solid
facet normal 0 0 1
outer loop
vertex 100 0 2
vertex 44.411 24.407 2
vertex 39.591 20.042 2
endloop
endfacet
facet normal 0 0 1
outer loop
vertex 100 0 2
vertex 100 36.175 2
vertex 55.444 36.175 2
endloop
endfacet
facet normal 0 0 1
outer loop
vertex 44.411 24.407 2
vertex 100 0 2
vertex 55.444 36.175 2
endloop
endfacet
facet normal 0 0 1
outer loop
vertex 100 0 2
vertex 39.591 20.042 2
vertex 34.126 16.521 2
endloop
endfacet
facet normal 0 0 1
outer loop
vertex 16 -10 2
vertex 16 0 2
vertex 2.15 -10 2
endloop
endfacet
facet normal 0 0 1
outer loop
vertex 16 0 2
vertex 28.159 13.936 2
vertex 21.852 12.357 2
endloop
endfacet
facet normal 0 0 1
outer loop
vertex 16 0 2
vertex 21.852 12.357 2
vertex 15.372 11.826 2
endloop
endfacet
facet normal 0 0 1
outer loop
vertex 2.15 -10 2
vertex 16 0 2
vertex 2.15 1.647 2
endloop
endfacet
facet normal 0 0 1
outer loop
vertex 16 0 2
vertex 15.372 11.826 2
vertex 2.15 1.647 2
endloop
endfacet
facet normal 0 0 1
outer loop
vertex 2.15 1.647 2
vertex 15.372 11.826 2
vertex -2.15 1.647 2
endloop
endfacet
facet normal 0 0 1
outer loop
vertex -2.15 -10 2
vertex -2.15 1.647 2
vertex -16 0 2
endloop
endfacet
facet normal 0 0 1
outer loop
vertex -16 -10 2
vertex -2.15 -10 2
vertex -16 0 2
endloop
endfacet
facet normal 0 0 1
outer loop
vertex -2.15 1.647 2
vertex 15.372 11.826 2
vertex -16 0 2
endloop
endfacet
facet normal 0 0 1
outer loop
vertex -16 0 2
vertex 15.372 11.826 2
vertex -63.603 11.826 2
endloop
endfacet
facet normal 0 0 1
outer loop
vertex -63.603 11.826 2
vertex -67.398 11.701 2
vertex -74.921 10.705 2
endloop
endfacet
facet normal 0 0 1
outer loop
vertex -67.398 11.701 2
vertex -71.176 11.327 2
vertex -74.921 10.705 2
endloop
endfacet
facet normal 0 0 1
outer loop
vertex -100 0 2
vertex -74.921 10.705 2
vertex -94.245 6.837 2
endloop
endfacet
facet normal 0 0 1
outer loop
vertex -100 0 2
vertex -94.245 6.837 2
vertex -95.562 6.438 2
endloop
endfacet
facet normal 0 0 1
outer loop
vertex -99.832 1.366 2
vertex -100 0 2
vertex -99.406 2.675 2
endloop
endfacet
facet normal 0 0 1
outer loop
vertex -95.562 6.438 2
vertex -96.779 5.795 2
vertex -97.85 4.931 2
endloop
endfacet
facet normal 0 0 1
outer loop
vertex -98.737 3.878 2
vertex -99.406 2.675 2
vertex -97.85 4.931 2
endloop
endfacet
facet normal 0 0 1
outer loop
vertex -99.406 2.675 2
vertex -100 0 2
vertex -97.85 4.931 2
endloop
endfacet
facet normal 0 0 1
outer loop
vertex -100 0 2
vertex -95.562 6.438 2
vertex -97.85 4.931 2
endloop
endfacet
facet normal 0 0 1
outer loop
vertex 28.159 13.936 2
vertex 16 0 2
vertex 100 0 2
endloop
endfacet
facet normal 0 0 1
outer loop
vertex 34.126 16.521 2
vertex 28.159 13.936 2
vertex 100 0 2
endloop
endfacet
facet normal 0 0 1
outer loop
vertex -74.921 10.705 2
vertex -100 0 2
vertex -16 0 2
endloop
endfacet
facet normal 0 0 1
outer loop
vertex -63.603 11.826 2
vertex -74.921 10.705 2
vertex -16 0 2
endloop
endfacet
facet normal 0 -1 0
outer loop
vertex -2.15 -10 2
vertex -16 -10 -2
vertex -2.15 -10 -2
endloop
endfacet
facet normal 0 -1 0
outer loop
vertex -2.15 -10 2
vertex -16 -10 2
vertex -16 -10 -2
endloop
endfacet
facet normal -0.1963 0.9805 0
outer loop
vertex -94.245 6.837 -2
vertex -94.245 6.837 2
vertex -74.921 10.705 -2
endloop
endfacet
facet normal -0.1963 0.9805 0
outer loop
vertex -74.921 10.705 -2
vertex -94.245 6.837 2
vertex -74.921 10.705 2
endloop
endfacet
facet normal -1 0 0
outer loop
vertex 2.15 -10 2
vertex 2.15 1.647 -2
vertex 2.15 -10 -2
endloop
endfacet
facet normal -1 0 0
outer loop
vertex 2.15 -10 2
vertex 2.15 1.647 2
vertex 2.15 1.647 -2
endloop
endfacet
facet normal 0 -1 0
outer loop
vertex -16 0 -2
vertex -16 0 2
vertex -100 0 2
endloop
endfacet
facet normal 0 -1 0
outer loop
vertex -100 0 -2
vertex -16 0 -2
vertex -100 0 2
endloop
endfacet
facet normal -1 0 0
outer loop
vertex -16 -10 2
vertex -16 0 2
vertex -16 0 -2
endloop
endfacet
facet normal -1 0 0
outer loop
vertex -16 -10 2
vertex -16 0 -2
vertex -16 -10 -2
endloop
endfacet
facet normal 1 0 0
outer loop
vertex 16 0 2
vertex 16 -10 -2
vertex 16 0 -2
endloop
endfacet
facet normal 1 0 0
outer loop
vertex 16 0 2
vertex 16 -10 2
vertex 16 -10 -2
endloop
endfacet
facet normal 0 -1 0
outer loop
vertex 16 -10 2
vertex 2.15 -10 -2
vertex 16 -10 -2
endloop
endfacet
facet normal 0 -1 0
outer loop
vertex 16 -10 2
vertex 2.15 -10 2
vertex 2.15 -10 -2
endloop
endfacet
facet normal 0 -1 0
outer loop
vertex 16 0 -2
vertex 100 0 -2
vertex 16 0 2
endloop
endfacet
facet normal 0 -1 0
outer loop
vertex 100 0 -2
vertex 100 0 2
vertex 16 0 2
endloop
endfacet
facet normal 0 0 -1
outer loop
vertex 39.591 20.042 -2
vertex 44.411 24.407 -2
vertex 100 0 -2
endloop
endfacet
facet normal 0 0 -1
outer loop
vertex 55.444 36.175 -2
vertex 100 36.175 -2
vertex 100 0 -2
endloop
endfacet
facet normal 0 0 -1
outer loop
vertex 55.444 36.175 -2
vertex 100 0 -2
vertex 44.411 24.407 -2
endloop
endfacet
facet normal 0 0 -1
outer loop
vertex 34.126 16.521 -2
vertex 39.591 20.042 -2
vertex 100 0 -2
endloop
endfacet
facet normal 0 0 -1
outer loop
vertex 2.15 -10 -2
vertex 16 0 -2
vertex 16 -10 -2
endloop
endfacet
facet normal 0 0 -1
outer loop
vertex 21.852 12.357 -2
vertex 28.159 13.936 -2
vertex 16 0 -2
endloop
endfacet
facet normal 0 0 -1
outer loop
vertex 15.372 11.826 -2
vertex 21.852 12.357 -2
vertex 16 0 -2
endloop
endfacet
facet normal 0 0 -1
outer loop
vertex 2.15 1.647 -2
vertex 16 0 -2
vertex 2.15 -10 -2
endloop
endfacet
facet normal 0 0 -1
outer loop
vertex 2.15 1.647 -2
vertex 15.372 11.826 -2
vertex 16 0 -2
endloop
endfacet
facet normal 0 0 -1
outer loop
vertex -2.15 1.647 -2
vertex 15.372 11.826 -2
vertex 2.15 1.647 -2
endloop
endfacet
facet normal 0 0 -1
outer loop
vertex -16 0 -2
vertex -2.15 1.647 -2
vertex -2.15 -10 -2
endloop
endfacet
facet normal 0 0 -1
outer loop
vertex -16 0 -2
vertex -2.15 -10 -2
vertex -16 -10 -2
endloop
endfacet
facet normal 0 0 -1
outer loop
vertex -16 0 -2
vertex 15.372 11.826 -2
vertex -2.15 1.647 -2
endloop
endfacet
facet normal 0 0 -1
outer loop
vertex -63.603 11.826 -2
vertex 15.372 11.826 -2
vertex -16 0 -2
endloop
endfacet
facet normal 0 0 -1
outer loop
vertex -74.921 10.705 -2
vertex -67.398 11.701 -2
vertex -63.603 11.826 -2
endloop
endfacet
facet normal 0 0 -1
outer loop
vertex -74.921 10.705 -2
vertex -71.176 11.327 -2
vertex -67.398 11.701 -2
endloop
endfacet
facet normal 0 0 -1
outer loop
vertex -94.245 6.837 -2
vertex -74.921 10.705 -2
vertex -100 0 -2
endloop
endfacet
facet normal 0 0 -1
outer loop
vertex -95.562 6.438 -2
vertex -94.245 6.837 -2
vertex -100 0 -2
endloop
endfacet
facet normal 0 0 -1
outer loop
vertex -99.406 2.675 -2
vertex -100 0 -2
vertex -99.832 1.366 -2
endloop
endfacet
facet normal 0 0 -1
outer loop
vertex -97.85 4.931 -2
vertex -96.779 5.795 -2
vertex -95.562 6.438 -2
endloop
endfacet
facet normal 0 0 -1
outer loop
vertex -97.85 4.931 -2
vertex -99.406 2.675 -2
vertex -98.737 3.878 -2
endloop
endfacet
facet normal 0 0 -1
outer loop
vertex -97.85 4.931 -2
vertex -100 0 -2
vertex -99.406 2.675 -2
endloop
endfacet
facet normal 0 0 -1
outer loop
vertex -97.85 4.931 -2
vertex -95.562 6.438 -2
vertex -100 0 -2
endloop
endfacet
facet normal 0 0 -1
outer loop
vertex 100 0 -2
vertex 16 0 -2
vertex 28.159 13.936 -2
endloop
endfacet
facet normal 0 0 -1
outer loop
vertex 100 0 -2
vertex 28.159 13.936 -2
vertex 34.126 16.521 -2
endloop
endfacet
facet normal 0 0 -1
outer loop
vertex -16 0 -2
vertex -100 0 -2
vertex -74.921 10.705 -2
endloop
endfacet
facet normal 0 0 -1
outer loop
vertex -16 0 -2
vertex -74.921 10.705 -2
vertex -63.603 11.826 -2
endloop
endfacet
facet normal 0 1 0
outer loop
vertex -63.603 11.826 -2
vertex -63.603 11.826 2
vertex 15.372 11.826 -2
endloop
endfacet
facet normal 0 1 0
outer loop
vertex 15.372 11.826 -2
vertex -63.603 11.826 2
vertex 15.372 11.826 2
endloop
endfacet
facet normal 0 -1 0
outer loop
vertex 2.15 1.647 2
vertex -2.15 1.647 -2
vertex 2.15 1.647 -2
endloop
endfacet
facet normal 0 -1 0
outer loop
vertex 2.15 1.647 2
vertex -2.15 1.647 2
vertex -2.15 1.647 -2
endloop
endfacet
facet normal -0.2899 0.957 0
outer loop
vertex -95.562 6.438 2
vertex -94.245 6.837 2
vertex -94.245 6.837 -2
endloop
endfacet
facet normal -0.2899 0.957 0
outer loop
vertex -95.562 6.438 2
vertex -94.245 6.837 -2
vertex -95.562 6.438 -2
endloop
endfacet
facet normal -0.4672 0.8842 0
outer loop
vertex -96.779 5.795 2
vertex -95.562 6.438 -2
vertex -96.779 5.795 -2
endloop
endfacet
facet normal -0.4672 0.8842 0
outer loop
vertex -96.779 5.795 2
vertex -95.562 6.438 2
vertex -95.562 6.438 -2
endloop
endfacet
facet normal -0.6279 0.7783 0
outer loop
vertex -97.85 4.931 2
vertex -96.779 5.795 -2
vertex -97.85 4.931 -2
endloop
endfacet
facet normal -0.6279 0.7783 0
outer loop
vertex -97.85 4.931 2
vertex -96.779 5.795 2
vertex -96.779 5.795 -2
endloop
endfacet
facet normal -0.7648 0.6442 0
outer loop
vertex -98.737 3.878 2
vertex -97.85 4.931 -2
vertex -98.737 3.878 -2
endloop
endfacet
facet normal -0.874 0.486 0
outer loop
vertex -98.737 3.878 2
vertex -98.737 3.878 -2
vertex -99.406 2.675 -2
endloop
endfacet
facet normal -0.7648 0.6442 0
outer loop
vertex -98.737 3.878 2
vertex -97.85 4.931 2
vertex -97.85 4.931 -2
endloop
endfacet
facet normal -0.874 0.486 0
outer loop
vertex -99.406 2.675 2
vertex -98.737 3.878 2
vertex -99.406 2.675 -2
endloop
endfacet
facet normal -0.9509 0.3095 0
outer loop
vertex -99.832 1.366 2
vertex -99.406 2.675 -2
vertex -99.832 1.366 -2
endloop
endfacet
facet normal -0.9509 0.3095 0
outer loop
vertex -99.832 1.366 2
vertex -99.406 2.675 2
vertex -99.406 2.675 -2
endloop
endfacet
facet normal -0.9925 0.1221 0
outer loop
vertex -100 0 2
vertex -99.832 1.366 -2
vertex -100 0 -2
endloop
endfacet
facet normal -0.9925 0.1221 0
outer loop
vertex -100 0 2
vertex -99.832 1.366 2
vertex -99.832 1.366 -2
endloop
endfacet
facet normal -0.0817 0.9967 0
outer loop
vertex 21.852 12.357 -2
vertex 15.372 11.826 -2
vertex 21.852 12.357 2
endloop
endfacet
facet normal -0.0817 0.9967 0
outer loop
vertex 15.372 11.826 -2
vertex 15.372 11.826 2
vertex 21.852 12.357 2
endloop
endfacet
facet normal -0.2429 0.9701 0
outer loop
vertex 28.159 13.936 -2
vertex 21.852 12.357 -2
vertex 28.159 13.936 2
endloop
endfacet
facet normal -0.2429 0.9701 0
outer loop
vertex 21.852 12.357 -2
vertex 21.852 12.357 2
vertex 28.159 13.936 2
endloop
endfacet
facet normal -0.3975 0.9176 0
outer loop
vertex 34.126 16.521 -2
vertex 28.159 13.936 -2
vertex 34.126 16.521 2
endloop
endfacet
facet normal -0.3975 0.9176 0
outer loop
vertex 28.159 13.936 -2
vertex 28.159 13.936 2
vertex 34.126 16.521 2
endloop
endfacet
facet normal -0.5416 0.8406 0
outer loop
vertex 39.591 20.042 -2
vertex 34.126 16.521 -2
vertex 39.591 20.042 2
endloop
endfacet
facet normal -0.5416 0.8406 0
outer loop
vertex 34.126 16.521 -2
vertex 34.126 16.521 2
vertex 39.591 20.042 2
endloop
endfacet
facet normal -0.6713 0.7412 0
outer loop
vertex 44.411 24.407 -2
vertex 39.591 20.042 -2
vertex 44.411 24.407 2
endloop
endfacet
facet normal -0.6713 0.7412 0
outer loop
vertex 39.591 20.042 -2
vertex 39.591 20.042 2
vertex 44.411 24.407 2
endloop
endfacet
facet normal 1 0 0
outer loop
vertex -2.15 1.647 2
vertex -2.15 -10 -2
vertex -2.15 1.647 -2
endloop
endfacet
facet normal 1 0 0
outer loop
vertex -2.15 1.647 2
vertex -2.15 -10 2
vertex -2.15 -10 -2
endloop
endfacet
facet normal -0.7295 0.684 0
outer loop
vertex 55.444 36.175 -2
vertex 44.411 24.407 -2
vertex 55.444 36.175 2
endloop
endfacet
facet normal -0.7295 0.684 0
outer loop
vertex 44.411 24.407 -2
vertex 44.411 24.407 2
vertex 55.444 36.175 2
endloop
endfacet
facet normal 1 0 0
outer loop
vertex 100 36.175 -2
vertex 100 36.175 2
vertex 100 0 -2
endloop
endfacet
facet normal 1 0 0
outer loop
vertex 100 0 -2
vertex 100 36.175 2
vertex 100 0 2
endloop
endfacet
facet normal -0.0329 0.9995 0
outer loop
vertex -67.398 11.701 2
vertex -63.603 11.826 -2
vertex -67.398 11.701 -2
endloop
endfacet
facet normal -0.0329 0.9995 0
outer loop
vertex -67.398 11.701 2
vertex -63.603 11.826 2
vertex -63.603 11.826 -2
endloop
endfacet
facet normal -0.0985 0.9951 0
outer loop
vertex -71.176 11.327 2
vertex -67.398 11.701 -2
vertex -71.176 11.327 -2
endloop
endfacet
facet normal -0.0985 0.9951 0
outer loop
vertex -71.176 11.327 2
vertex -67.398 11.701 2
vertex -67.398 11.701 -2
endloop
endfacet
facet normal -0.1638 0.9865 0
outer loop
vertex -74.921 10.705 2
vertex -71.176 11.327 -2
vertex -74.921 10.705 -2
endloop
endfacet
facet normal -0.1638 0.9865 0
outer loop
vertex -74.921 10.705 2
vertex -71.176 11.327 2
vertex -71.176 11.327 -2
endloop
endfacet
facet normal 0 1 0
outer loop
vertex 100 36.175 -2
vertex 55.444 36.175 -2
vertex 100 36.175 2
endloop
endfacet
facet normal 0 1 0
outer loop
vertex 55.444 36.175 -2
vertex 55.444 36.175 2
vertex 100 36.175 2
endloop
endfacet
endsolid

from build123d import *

# Parameters (mm, degrees)
PAD_DEPTH = 2


with BuildPart() as part:
    # CopySketch004 → Pad (new body, symmetric)
    with BuildSketch(Plane.XY):
        with BuildLine():
            Line((-94.244626, 6.836694), (-74.920651, 10.704806))
            ThreePointArc((-63.603328, 11.826385), (-69.28971, 11.545305), (-74.920651, 10.704806))
            Line((-63.603328, 11.826385), (-42.55212, 11.826385))
            Line((-42.55212, 11.826385), (15.371862, 11.826385))
            ThreePointArc((15.371862, 11.826385), (31.195362, 15.106628), (44.410932, 24.406728))
            Line((44.410932, 24.406728), (55.444454, 36.175392))
            Line((55.444454, 36.175392), (100, 36.175392))
            Line((100, 36.175392), (100, 0))
            Line((100, 0), (16, 0))
            Line((16, -10), (16, 0))
            Line((2.15, -10), (16, -10))
            Line((2.15, 1.647389), (2.15, -10))
            Line((-2.15, 1.647389), (2.15, 1.647389))
            Line((-2.15, -10), (-2.15, 1.647389))
            Line((-16, -10), (-2.15, -10))
            Line((-16, 0), (-16, -10))
            Line((-16, 0), (-100, 0))
            ThreePointArc((-94.244626, 6.836694), (-98.319024, 4.425781), (-100, 0))
        make_face()
    extrude(amount=PAD_DEPTH, both=True)


solid = part.part
